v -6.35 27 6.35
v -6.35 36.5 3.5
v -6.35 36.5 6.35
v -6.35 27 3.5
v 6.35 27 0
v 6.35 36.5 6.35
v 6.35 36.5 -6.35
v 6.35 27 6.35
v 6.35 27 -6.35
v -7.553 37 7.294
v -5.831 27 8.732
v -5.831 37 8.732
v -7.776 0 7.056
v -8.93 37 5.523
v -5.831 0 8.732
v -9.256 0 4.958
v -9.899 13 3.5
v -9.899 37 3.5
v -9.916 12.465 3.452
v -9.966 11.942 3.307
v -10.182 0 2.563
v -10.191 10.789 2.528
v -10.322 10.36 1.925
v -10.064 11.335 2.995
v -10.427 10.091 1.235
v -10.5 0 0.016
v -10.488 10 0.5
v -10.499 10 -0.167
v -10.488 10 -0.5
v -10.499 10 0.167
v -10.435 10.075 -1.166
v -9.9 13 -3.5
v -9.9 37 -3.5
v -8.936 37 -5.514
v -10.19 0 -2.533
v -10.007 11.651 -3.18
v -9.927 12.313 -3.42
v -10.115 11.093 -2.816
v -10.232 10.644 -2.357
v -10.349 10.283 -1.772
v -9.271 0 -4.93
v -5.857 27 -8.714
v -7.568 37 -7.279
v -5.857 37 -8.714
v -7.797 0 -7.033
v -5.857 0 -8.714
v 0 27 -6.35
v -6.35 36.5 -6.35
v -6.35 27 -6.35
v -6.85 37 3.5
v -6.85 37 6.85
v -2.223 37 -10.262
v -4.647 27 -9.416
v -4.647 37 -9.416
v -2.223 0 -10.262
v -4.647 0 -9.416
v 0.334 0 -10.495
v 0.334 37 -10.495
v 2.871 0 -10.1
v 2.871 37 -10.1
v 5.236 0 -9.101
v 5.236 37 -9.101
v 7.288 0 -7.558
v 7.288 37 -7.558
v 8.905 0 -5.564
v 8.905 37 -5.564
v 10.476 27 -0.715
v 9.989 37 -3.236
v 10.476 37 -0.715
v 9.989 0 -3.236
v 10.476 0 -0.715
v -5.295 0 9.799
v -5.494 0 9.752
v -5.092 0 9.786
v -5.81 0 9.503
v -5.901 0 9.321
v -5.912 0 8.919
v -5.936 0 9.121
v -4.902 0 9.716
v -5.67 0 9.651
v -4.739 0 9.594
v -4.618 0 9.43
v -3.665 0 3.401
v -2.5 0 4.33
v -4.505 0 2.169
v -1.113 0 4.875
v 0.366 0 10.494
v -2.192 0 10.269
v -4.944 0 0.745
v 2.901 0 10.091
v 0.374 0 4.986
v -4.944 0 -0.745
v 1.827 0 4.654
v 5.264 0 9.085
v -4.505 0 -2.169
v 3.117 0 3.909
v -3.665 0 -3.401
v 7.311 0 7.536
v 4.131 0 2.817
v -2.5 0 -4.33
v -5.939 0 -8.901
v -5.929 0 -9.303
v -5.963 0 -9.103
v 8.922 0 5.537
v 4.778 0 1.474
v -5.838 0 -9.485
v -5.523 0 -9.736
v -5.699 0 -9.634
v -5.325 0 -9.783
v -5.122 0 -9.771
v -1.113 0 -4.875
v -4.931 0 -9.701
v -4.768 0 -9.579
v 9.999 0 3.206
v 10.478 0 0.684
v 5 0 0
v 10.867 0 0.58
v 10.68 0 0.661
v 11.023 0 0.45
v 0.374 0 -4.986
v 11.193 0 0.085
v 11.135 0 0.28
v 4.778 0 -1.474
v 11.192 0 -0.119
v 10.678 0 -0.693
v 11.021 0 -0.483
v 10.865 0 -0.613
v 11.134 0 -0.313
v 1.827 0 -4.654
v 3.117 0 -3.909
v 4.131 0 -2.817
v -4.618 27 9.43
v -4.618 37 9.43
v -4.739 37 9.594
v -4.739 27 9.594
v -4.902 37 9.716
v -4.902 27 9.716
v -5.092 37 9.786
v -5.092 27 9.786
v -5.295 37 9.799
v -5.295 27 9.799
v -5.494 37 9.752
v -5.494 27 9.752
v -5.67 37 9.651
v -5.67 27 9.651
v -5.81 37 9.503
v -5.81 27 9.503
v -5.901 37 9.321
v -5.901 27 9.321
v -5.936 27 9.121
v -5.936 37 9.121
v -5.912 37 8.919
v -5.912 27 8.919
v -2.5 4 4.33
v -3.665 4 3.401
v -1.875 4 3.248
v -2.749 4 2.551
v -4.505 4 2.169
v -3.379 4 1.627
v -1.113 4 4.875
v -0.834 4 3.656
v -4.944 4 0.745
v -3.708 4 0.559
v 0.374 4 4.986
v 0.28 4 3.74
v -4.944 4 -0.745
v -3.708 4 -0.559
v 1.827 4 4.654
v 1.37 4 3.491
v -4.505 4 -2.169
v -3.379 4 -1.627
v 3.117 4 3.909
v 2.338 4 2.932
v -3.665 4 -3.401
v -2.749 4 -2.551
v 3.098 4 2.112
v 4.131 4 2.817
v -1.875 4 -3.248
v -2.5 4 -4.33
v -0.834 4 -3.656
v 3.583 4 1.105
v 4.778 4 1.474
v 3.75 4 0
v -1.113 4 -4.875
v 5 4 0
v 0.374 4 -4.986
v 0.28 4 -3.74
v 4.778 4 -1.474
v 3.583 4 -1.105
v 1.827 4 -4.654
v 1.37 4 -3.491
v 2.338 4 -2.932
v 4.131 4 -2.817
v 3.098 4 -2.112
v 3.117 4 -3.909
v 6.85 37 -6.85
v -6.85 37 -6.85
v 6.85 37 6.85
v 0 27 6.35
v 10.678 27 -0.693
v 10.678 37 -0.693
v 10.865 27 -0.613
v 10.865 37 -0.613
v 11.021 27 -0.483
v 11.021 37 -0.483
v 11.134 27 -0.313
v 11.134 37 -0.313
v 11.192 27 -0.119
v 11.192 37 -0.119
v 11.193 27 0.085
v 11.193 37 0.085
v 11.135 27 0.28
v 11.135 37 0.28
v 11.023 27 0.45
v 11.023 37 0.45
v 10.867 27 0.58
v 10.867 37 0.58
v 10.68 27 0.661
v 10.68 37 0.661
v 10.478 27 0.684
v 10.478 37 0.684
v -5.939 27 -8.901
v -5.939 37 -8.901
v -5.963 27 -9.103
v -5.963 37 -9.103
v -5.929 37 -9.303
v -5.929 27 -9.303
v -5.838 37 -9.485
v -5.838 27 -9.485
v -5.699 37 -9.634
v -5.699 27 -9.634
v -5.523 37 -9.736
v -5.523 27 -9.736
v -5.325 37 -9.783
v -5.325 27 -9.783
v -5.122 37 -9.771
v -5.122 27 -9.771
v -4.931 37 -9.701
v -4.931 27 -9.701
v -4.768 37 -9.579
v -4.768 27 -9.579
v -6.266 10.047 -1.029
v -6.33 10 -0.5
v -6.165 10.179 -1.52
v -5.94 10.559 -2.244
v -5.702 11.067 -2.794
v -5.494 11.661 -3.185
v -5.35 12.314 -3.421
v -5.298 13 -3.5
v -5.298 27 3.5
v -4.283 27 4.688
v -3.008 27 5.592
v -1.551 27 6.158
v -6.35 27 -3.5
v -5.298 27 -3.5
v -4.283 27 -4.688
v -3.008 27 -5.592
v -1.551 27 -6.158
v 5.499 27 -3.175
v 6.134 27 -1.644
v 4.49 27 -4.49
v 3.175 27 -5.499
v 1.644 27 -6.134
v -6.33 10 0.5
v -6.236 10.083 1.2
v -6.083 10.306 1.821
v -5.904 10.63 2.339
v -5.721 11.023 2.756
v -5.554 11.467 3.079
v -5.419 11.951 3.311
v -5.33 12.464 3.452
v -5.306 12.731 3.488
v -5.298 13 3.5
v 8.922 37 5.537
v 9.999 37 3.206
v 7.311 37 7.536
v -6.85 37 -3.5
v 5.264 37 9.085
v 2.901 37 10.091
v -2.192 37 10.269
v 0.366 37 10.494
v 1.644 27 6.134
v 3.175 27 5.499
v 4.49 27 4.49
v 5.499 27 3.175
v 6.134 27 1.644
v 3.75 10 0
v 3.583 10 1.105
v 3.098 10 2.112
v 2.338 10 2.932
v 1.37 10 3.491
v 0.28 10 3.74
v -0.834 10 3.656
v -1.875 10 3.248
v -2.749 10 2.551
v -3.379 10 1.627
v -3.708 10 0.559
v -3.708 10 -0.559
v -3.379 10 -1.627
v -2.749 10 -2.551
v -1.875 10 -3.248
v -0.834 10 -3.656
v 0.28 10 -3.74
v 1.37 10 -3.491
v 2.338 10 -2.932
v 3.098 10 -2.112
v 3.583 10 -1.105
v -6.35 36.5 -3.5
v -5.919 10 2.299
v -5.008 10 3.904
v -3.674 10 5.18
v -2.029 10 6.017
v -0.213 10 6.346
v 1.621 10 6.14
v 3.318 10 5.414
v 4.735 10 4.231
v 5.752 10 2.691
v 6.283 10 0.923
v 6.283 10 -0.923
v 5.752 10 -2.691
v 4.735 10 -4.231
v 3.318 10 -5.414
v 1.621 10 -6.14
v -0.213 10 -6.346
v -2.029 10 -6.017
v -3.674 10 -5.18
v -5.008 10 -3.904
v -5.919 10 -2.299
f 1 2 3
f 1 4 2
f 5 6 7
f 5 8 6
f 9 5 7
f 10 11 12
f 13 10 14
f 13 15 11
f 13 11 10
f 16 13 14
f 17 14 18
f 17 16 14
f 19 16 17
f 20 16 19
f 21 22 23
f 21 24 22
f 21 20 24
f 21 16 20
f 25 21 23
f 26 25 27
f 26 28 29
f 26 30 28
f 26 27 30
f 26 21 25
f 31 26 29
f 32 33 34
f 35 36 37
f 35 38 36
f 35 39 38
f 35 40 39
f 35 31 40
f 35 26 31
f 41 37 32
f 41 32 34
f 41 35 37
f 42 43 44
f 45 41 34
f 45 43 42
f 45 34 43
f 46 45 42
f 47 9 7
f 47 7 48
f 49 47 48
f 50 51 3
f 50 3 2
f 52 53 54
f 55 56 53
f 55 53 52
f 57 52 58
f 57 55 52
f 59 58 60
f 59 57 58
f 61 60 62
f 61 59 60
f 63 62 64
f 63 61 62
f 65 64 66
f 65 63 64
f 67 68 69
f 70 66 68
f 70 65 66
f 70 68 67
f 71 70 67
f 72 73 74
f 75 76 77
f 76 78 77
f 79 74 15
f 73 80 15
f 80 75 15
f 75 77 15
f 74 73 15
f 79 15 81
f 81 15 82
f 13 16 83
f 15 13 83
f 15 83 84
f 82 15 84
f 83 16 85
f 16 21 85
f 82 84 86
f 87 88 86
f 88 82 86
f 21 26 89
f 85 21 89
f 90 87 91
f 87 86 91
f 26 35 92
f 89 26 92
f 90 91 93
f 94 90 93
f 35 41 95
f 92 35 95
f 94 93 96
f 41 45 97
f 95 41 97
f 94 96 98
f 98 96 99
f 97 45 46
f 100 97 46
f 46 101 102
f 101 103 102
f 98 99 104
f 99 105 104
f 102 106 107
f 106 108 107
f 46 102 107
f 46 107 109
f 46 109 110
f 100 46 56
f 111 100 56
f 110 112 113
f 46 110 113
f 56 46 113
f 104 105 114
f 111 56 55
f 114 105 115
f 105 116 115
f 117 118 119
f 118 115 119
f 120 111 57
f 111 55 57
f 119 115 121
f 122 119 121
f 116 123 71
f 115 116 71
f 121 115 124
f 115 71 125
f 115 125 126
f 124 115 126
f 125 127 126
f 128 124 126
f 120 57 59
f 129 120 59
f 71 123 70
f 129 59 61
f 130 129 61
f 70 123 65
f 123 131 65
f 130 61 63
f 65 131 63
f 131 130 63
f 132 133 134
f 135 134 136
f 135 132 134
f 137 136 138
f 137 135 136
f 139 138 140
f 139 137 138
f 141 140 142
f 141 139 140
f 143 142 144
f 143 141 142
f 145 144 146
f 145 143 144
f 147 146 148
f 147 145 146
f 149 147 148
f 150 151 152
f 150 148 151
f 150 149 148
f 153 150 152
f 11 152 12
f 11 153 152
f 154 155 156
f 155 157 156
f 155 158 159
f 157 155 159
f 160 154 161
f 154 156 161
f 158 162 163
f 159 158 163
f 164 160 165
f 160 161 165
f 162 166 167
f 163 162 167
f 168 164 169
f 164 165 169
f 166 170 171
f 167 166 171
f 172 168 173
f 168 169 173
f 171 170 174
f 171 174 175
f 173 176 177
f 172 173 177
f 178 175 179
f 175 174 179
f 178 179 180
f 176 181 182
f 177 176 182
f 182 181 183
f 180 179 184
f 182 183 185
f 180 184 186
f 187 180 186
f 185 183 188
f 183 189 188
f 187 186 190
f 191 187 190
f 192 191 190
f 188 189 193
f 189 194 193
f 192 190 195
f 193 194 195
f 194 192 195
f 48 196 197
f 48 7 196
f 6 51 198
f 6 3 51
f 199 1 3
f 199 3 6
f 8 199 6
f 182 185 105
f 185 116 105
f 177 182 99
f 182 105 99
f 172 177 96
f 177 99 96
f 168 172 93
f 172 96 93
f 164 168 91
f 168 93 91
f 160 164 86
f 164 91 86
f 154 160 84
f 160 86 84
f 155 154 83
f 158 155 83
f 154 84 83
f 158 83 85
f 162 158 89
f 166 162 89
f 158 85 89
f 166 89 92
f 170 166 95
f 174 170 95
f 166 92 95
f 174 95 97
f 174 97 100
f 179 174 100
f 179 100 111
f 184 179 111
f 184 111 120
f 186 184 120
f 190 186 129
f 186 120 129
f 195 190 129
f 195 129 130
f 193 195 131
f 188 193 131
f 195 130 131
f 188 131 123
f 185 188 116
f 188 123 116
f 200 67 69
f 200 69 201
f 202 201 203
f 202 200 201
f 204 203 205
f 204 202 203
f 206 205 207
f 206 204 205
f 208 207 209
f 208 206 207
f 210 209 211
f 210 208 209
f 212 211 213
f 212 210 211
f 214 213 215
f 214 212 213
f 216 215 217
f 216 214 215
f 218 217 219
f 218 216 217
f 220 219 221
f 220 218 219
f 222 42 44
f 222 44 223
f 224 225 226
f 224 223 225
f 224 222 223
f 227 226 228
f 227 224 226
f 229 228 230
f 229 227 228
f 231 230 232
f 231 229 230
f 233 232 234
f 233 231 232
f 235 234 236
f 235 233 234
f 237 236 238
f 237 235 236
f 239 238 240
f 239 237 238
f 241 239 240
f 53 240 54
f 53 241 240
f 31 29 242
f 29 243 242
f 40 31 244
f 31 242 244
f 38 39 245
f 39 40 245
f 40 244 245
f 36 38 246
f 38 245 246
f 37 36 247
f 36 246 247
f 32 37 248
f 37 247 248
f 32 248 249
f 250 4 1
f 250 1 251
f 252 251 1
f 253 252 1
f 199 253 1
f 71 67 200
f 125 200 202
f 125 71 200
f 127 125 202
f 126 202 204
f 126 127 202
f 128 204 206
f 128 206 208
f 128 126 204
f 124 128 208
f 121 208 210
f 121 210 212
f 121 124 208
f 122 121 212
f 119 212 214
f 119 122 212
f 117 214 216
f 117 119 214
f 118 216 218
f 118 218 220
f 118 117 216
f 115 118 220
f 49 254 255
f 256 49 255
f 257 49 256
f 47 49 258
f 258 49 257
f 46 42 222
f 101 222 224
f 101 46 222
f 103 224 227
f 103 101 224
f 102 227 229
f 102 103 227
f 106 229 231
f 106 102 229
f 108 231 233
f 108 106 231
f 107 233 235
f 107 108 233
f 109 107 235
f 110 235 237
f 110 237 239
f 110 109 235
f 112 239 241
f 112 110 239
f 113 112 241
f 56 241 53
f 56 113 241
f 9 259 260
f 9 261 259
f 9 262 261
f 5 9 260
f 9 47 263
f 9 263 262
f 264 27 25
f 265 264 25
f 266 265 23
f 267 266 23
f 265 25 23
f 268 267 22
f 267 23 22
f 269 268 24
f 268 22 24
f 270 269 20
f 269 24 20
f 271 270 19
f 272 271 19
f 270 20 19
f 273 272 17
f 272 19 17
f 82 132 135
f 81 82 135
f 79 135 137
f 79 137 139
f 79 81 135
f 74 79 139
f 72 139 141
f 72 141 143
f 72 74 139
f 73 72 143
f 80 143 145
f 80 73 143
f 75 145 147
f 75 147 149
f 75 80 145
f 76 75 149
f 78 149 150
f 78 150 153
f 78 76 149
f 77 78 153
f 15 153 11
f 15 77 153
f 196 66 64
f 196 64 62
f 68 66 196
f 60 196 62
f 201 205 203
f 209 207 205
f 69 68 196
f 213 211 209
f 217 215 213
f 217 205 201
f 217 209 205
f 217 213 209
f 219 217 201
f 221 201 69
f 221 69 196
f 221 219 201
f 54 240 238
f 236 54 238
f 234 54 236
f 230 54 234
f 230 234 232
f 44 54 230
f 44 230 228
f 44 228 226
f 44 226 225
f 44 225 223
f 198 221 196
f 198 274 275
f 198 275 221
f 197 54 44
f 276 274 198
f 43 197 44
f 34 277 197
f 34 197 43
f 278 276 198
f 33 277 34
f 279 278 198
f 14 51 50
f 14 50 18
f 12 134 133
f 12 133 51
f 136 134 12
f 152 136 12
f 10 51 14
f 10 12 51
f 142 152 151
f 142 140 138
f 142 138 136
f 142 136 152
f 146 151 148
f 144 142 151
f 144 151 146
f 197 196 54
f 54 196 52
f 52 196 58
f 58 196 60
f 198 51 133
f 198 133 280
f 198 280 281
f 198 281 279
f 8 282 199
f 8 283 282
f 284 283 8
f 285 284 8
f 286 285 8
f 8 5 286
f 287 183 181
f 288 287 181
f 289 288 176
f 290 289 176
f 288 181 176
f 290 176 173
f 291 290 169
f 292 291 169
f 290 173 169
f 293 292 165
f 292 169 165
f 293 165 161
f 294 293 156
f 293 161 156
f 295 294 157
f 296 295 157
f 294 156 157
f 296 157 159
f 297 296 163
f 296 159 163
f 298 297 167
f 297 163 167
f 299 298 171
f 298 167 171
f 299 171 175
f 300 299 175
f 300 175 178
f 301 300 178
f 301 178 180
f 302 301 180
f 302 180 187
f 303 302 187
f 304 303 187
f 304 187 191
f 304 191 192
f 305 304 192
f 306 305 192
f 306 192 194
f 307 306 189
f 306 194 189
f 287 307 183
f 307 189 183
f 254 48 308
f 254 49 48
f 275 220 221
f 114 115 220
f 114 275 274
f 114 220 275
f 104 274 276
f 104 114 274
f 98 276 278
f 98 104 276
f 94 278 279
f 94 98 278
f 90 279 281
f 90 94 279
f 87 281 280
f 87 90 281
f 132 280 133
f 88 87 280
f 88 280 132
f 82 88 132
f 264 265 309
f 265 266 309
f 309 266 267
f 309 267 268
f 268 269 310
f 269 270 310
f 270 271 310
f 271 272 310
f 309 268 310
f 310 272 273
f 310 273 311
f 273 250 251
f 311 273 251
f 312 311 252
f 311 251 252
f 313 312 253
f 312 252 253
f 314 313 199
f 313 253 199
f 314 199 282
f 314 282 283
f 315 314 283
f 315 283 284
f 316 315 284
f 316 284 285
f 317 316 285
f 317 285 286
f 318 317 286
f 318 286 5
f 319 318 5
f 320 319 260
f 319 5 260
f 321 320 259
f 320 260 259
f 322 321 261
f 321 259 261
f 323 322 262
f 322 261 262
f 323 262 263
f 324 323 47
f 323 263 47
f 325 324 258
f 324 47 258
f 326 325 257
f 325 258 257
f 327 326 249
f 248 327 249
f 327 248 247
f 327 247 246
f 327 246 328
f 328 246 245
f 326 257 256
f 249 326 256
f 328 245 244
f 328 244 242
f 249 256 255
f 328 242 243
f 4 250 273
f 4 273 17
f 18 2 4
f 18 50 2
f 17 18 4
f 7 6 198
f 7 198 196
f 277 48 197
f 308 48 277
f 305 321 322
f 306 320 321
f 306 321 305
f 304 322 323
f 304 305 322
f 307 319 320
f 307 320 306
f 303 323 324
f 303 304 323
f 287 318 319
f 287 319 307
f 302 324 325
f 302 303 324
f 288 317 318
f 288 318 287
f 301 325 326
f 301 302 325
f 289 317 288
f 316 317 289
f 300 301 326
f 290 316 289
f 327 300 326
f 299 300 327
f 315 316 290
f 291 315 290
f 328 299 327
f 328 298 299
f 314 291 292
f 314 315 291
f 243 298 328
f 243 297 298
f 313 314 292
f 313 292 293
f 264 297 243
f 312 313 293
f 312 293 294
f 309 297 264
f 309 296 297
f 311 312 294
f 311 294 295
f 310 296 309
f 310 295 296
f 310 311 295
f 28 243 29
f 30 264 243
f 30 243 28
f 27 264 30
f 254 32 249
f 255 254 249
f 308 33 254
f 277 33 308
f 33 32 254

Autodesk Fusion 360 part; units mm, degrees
sketch "Sketch1" plane through (0, 0, 0) normal (0, 1, 0) x (1, 0, 0) in component "ChargerSpacer"
  arc A0 (-5.8311, -8.732) -> (-5.8573, 8.7145) centre (0, 0) cw
  arc A1 (-4.6183, -9.4298) -> (-5.8311, -8.732) centre (-5.2363, -9.1011) cw
  line L0 (-20, 3.982) -> (0, 3.982)
  arc A2 (10.4756, 0.7154) -> (10.4777, -0.6839) centre (10.5, 0.0158) cw
  arc A3 (-4.6466, 9.4159) -> (10.4756, 0.7154) centre (0, 0) cw
  arc A4 (10.4777, -0.6839) -> (-4.6183, -9.4298) centre (0, 0) cw
  arc A5 (-5.8573, 8.7145) -> (-4.6466, 9.4159) centre (-5.2637, 9.0854) cw
  line L1 (-20, -4.0237) -> (-20, 3.982)
  circle A6 centre (0, 0) radius 8
  line L2 (0, 3.982) -> (0, -4.0237)
  line L3 (0, -4.0237) -> (-20, -4.0237)
  circle A7 centre (0, 0) radius 5
  circle A8 centre (0, 0) radius 3.75
  dimension "d8" = 10
  dimension "d9" = 7.5
extrude "Extrude8" add sketch "Sketch1" along normal blind 27 contours A0 A1 L0 A2 A3 A4 A5 A6 L3 | A0 L0 A6 L3 | L0 A6 L3 A7 | L0 A6 L3 A7 | L0 L2 L3 A7 A8 | L0 L2 L3 A7 A8 in component "ChargerSpacer"
sketch "Sketch2" plane through (0, 27, 0) normal (0, 1, 0) x (-1, 0, 0) in component "ChargerSpacer"
  circle A0 centre (0, 0) radius 4
  line L0 (6.35, 6.35) -> (-6.35, 6.35)
  line L1 (-6.35, 6.35) -> (-6.35, -6.35)
  line L2 (-6.35, -6.35) -> (6.35, -6.35)
  line L3 (6.35, -6.35) -> (6.35, 6.35)
  line L4 (6.35, 6.35) -> (-6.35, -6.35) construction
  line L5 (-6.35, 6.35) -> (6.35, -6.35) construction
  line L6 (6.35, 6.35) -> (19.35, 6.35)
  line L7 (19.35, 6.35) -> (19.35, -6.35)
  line L8 (19.35, -6.35) -> (6.35, -6.35)
  line L9 (6.35, -6.35) -> (6.35, 6.35)
  circle A1 centre (0, 0) radius 6.35
  line L10 (12.5, -3.5) -> (-12.5, -3.5)
  line L11 (-12.5, -3.5) -> (-12.5, 3.5)
  line L12 (-12.5, 3.5) -> (12.5, 3.5)
  line L13 (12.5, 3.5) -> (12.5, -3.5)
  line L14 (12.5, -3.5) -> (-12.5, 3.5) construction
  line L15 (-12.5, -3.5) -> (12.5, 3.5) construction
  arc A2 (5.8573, -8.7145) -> (5.8311, 8.732) centre (0, 0) ccw
  arc A3 (5.8311, 8.732) -> (4.6183, 9.4298) centre (5.2363, 9.1011) ccw
  arc A4 (4.6183, 9.4298) -> (-10.4777, 0.6839) centre (0, 0) ccw
  arc A5 (-10.4777, 0.6839) -> (-10.4756, -0.7154) centre (-10.5, -0.0158) ccw
  arc A6 (-10.4756, -0.7154) -> (4.6466, -9.4159) centre (0, 0) ccw
  arc A7 (4.6466, -9.4159) -> (5.8573, -8.7145) centre (5.2637, -9.0854) ccw
  circle A8 centre (0, 0) radius 3.75
  dimension "d18" = 12.7
  dimension "d19" = 12.7
  dimension "d20" = 13
  dimension "d21" = 12.7
  dimension "d22" = 12.7
  dimension "d27" = 25
  dimension "d28" = 7
extrude "Extrude9" cut sketch "Sketch1" along normal blind 4 contours L0 L2 L3 A7 A8 | L0 L2 L3 A7 A8 in component "ChargerSpacer"
extrude "Extrude10" add sketch "Sketch2" along normal blind 10 contours L0 L1 L6 L12 A2 A3 A4 | L3 L6 L9 L12 A2 | L1 L2 L8 L10 A2 A6 A7 | L3 L8 L9 L10 A2 | L1 L10 L12 A4 A5 A6 in component "ChargerSpacer"
extrude "Extrude11" cut sketch "Sketch2" against normal blind 17 contours A0 L10 L12 A8 | A0 A1 L10 L12 | A0 L12 A8 | A0 A1 L12 | A0 A1 L10 | A0 L10 A8 | A0 L10 L12 A8 | A0 A1 L10 L12 | L3 L9 A1 L12 | L3 L9 A1 L10 | L3 L9 L10 L12 A2 in component "ChargerSpacer"
fillet "Fillet1" radius 3 2 edges at (-7.5989, 10, -3.5) (-7.5989, 10, 3.5) in component "ChargerSpacer"
chamfer "Chamfer1" distance 0.5 angle 45 5 edges at (-6.35, 37, -4.925) (0, 37, -6.35) (-6.35, 37, 4.925) (0, 37, 6.35) (6.35, 37, 0) in component "ChargerSpacer"
component "ChargerSpacer" placed x (1, 0, 0) y (0, 1, 0) z (0, 0, 1) at (0, 0, 0)
